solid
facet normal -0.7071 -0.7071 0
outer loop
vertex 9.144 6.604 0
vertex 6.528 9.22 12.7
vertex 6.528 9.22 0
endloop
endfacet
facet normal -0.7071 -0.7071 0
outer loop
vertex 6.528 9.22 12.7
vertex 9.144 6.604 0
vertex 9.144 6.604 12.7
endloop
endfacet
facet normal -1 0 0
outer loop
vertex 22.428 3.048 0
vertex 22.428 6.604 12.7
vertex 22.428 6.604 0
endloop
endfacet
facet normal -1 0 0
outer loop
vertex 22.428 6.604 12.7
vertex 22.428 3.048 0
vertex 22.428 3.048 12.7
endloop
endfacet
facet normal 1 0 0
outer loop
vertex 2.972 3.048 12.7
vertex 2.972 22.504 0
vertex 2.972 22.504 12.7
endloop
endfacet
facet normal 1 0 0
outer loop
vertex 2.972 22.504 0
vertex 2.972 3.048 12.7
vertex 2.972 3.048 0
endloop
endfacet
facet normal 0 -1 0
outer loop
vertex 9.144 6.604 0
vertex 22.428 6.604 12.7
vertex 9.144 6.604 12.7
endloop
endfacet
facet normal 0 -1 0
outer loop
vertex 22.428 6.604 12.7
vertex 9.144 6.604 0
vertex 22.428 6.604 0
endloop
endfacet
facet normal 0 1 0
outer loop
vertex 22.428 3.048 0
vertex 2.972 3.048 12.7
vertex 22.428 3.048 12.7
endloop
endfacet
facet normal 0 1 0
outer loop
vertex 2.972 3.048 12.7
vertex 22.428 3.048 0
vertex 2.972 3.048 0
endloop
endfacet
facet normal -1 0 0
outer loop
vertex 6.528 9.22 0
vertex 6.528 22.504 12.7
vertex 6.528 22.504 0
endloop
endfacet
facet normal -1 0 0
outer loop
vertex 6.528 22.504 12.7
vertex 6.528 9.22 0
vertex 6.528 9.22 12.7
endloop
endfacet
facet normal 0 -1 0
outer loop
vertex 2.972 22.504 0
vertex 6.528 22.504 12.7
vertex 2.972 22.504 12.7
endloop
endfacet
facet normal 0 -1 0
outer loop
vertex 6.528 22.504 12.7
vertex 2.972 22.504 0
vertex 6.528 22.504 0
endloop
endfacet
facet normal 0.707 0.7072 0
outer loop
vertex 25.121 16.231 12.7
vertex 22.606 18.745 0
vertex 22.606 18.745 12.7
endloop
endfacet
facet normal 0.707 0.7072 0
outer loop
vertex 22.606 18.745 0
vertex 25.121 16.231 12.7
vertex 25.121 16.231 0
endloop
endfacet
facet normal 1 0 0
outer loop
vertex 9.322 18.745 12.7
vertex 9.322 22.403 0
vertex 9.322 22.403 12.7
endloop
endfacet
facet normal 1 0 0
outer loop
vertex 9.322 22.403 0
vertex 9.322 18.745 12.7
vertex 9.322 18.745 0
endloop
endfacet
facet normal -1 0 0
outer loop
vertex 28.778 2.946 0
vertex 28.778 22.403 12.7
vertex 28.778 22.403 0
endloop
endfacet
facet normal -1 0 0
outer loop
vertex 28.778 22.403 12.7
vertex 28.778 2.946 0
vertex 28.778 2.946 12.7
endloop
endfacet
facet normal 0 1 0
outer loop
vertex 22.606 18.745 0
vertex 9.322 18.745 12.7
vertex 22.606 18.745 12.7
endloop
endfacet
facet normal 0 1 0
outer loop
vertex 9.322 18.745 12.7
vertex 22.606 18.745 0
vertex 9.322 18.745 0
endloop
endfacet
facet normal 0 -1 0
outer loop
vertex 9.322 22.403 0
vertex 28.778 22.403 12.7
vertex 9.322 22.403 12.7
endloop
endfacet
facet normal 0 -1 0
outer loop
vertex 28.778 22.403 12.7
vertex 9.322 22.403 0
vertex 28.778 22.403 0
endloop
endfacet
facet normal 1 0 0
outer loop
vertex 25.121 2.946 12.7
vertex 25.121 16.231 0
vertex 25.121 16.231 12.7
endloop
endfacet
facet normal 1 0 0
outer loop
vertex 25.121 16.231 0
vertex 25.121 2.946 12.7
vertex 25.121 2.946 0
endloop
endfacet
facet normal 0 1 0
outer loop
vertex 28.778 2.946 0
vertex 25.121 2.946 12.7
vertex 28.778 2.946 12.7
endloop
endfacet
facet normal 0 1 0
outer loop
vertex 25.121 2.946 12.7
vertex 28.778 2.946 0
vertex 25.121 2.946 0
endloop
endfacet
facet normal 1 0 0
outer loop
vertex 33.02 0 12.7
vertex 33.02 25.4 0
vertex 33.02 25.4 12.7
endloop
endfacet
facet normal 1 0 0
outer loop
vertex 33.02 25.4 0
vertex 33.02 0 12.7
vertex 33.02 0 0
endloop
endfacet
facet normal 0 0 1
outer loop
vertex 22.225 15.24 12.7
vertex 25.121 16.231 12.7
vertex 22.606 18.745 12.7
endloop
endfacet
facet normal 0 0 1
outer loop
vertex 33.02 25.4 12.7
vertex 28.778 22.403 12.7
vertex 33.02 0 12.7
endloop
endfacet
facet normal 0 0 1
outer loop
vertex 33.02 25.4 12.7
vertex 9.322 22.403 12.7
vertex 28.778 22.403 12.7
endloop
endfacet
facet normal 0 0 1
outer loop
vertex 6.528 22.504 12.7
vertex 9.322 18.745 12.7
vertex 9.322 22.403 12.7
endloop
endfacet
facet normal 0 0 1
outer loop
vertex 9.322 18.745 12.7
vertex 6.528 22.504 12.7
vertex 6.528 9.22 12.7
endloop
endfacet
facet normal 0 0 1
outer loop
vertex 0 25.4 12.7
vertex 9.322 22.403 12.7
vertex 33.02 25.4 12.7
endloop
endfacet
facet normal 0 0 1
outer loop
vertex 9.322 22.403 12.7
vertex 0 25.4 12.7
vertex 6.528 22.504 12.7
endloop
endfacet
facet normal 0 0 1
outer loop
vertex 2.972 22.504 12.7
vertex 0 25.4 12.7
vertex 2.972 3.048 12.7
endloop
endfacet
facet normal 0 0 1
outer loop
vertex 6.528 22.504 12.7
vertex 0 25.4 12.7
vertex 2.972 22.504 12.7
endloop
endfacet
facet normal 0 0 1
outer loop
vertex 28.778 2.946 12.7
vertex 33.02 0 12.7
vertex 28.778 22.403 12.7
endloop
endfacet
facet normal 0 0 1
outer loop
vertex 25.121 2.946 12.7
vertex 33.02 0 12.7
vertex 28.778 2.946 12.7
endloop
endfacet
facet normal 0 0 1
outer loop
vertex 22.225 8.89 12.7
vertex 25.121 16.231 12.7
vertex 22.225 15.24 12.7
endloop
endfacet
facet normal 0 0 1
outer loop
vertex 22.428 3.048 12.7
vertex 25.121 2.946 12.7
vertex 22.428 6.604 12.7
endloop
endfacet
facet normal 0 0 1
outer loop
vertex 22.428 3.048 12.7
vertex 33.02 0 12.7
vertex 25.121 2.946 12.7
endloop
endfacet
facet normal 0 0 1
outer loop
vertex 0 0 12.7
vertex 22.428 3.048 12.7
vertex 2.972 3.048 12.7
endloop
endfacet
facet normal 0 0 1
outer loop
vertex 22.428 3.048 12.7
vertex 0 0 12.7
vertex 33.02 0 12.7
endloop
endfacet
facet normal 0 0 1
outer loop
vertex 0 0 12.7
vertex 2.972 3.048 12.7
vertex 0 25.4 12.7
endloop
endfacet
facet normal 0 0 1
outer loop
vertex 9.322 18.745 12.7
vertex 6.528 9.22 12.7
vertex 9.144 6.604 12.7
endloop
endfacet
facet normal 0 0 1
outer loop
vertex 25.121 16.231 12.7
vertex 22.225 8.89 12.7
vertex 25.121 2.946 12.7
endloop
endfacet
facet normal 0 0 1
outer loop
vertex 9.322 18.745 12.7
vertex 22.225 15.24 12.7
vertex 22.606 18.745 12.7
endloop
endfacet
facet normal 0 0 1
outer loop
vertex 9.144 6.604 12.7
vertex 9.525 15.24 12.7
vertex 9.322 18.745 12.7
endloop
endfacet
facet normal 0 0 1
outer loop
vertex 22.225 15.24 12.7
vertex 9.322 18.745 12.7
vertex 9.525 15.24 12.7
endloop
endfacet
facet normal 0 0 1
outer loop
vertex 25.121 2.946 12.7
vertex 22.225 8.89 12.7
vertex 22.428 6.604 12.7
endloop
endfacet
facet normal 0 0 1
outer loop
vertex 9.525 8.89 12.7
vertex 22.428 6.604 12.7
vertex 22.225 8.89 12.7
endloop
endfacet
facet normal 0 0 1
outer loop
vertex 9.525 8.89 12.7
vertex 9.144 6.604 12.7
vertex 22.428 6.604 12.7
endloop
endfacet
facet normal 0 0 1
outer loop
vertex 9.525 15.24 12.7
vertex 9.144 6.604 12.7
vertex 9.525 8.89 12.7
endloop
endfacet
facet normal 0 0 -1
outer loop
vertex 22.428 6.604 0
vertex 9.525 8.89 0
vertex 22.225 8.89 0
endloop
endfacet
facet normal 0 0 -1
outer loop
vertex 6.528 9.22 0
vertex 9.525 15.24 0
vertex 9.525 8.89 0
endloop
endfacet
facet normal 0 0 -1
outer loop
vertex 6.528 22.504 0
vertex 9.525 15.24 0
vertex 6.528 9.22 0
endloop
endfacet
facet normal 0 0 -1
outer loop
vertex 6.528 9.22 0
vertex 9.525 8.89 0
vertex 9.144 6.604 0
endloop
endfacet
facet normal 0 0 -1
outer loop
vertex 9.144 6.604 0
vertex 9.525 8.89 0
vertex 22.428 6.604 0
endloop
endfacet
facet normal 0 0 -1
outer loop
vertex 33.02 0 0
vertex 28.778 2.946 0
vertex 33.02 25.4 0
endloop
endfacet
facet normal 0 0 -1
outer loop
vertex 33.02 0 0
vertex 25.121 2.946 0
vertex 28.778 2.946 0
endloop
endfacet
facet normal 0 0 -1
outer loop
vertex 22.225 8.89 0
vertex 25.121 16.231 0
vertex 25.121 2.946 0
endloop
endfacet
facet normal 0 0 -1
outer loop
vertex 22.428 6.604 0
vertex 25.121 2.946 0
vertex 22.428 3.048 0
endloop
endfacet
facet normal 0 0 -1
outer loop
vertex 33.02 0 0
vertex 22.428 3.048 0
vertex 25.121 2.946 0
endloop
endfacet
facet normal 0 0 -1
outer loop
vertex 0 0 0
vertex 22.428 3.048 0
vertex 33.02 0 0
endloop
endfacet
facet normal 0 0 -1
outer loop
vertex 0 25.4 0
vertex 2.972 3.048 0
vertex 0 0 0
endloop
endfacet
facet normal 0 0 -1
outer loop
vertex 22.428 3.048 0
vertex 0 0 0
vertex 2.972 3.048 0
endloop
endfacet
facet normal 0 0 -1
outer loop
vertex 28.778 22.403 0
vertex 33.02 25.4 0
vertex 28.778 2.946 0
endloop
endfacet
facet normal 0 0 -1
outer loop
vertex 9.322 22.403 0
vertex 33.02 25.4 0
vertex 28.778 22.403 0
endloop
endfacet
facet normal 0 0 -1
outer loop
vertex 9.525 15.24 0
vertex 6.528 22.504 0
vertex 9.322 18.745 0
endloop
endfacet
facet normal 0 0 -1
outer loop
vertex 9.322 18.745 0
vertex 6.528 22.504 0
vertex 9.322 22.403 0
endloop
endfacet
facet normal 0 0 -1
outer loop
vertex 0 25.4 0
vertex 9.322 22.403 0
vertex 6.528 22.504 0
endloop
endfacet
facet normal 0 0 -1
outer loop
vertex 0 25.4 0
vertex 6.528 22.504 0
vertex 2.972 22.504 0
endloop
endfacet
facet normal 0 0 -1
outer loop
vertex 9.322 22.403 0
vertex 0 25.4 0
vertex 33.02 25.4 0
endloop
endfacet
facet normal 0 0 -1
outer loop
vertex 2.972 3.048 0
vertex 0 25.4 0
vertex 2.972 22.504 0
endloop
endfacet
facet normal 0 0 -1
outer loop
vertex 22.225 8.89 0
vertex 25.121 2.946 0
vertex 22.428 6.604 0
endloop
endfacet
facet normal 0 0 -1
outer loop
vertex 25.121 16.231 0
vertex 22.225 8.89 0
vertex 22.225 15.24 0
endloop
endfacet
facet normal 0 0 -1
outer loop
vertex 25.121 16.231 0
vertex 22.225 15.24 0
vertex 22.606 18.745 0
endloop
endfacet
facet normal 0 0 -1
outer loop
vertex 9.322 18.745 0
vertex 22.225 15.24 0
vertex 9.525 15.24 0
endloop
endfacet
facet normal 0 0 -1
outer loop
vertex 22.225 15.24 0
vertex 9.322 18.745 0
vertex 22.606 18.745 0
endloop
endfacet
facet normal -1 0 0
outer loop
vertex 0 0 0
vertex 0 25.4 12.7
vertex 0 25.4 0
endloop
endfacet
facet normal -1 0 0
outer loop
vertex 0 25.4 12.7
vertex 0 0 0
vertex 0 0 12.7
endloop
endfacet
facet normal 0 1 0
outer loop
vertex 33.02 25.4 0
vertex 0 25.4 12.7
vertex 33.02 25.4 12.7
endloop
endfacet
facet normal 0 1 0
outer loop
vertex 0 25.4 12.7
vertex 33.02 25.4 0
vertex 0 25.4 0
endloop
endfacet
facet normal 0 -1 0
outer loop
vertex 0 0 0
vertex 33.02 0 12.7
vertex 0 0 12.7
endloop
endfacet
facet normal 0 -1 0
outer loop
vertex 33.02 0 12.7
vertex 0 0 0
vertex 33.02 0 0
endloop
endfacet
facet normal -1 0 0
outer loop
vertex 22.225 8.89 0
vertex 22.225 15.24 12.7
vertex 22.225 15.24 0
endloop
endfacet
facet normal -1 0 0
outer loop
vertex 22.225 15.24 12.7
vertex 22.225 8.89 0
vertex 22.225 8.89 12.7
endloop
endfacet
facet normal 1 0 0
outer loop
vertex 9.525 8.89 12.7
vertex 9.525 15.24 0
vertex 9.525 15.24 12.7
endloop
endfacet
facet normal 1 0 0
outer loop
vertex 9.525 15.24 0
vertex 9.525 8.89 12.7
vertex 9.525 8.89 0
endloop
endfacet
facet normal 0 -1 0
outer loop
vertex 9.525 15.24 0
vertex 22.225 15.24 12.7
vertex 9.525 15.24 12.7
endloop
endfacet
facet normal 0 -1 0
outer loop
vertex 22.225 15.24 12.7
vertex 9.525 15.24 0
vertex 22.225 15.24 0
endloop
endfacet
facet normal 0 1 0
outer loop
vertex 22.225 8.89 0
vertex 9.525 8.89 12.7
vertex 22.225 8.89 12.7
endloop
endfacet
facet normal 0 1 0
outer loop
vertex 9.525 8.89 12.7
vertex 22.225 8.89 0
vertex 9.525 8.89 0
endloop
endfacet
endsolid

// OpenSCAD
// file: Angle Stock.scad
3_4_angle_stock_width                     = 3/4;
3_4_angle_stock_thickness                 = 0.13;
3_4_angle_stock_trough                    = 0.235; // Thickness across the "elbow" of the angle
3_4_angle_stock_height                    = 0.574;
3_4_angle_stock_width_clearance           = 0.008;
3_4_angle_stock_width_clearance_loose     = 0.008;
3_4_angle_stock_thickness_clearance       = 0.005;
3_4_angle_stock_thickness_clearance_loose = 0.007;

module 3_4_angle_stock(length=1, cutter=false, loose=false) {
  width_clearance     = loose ? 3_4_angle_stock_width_clearance_loose     : 3_4_angle_stock_width_clearance;
  thickness_clearance = loose ? 3_4_angle_stock_thickness_clearance_loose : 3_4_angle_stock_thickness_clearance;

  union() {
    if (cutter) {
      translate([-width_clearance,-thickness_clearance,0])
      cube([3_4_angle_stock_width     + width_clearance*2,
            3_4_angle_stock_thickness + thickness_clearance*2,
            length]);

      translate([-width_clearance,-thickness_clearance,0])
      cube([3_4_angle_stock_thickness + thickness_clearance*2,
            3_4_angle_stock_width     + width_clearance*2,
            length]);

      translate([3_4_angle_stock_thickness/2, 3_4_angle_stock_thickness/2, 0])
      difference() {
        cube([3_4_angle_stock_trough + thickness_clearance/2,
              3_4_angle_stock_trough + thickness_clearance/2,
              length]);

        translate([3_4_angle_stock_trough + thickness_clearance/2,
                   thickness_clearance/2,
                   -0.1])
        rotate([0,0,45])
        cube([3_4_angle_stock_trough*sqrt(2),
              3_4_angle_stock_trough*sqrt(2),
              length + 0.2]);
      }

    } else {
      cube([3_4_angle_stock_width,3_4_angle_stock_thickness,length]);
      cube([3_4_angle_stock_thickness,3_4_angle_stock_width,length]);

      translate([3_4_angle_stock_thickness, 3_4_angle_stock_thickness, 0])
      difference() {
        cube([3_4_angle_stock_trough, 3_4_angle_stock_trough,length]);

        translate([3_4_angle_stock_trough,0,-0.1])
        rotate([0,0,45])
        cube([3_4_angle_stock_trough*sqrt(2), 3_4_angle_stock_trough*sqrt(2),length + 0.2]);
      }
    }
  };
}
// main file
include <Angle Stock.scad>;

scale([25.4, 25.4, 25.4]) {

  difference() {
    cube([1.3,1,1/2]);
    
    // Cut out the middle to save materials
    translate([6/16,.35,-0.1])
    cube([8/16, 1/4, 1]);

    // Tight
    translate([1/8, 1/8, -0.1])
    3_4_angle_stock(length=1, cutter=true);

    // Loose
    translate([9/8, 7/8, -0.1])
    rotate([0,0,180])
    3_4_angle_stock(length=1, cutter=true, loose=true);
  }
}
